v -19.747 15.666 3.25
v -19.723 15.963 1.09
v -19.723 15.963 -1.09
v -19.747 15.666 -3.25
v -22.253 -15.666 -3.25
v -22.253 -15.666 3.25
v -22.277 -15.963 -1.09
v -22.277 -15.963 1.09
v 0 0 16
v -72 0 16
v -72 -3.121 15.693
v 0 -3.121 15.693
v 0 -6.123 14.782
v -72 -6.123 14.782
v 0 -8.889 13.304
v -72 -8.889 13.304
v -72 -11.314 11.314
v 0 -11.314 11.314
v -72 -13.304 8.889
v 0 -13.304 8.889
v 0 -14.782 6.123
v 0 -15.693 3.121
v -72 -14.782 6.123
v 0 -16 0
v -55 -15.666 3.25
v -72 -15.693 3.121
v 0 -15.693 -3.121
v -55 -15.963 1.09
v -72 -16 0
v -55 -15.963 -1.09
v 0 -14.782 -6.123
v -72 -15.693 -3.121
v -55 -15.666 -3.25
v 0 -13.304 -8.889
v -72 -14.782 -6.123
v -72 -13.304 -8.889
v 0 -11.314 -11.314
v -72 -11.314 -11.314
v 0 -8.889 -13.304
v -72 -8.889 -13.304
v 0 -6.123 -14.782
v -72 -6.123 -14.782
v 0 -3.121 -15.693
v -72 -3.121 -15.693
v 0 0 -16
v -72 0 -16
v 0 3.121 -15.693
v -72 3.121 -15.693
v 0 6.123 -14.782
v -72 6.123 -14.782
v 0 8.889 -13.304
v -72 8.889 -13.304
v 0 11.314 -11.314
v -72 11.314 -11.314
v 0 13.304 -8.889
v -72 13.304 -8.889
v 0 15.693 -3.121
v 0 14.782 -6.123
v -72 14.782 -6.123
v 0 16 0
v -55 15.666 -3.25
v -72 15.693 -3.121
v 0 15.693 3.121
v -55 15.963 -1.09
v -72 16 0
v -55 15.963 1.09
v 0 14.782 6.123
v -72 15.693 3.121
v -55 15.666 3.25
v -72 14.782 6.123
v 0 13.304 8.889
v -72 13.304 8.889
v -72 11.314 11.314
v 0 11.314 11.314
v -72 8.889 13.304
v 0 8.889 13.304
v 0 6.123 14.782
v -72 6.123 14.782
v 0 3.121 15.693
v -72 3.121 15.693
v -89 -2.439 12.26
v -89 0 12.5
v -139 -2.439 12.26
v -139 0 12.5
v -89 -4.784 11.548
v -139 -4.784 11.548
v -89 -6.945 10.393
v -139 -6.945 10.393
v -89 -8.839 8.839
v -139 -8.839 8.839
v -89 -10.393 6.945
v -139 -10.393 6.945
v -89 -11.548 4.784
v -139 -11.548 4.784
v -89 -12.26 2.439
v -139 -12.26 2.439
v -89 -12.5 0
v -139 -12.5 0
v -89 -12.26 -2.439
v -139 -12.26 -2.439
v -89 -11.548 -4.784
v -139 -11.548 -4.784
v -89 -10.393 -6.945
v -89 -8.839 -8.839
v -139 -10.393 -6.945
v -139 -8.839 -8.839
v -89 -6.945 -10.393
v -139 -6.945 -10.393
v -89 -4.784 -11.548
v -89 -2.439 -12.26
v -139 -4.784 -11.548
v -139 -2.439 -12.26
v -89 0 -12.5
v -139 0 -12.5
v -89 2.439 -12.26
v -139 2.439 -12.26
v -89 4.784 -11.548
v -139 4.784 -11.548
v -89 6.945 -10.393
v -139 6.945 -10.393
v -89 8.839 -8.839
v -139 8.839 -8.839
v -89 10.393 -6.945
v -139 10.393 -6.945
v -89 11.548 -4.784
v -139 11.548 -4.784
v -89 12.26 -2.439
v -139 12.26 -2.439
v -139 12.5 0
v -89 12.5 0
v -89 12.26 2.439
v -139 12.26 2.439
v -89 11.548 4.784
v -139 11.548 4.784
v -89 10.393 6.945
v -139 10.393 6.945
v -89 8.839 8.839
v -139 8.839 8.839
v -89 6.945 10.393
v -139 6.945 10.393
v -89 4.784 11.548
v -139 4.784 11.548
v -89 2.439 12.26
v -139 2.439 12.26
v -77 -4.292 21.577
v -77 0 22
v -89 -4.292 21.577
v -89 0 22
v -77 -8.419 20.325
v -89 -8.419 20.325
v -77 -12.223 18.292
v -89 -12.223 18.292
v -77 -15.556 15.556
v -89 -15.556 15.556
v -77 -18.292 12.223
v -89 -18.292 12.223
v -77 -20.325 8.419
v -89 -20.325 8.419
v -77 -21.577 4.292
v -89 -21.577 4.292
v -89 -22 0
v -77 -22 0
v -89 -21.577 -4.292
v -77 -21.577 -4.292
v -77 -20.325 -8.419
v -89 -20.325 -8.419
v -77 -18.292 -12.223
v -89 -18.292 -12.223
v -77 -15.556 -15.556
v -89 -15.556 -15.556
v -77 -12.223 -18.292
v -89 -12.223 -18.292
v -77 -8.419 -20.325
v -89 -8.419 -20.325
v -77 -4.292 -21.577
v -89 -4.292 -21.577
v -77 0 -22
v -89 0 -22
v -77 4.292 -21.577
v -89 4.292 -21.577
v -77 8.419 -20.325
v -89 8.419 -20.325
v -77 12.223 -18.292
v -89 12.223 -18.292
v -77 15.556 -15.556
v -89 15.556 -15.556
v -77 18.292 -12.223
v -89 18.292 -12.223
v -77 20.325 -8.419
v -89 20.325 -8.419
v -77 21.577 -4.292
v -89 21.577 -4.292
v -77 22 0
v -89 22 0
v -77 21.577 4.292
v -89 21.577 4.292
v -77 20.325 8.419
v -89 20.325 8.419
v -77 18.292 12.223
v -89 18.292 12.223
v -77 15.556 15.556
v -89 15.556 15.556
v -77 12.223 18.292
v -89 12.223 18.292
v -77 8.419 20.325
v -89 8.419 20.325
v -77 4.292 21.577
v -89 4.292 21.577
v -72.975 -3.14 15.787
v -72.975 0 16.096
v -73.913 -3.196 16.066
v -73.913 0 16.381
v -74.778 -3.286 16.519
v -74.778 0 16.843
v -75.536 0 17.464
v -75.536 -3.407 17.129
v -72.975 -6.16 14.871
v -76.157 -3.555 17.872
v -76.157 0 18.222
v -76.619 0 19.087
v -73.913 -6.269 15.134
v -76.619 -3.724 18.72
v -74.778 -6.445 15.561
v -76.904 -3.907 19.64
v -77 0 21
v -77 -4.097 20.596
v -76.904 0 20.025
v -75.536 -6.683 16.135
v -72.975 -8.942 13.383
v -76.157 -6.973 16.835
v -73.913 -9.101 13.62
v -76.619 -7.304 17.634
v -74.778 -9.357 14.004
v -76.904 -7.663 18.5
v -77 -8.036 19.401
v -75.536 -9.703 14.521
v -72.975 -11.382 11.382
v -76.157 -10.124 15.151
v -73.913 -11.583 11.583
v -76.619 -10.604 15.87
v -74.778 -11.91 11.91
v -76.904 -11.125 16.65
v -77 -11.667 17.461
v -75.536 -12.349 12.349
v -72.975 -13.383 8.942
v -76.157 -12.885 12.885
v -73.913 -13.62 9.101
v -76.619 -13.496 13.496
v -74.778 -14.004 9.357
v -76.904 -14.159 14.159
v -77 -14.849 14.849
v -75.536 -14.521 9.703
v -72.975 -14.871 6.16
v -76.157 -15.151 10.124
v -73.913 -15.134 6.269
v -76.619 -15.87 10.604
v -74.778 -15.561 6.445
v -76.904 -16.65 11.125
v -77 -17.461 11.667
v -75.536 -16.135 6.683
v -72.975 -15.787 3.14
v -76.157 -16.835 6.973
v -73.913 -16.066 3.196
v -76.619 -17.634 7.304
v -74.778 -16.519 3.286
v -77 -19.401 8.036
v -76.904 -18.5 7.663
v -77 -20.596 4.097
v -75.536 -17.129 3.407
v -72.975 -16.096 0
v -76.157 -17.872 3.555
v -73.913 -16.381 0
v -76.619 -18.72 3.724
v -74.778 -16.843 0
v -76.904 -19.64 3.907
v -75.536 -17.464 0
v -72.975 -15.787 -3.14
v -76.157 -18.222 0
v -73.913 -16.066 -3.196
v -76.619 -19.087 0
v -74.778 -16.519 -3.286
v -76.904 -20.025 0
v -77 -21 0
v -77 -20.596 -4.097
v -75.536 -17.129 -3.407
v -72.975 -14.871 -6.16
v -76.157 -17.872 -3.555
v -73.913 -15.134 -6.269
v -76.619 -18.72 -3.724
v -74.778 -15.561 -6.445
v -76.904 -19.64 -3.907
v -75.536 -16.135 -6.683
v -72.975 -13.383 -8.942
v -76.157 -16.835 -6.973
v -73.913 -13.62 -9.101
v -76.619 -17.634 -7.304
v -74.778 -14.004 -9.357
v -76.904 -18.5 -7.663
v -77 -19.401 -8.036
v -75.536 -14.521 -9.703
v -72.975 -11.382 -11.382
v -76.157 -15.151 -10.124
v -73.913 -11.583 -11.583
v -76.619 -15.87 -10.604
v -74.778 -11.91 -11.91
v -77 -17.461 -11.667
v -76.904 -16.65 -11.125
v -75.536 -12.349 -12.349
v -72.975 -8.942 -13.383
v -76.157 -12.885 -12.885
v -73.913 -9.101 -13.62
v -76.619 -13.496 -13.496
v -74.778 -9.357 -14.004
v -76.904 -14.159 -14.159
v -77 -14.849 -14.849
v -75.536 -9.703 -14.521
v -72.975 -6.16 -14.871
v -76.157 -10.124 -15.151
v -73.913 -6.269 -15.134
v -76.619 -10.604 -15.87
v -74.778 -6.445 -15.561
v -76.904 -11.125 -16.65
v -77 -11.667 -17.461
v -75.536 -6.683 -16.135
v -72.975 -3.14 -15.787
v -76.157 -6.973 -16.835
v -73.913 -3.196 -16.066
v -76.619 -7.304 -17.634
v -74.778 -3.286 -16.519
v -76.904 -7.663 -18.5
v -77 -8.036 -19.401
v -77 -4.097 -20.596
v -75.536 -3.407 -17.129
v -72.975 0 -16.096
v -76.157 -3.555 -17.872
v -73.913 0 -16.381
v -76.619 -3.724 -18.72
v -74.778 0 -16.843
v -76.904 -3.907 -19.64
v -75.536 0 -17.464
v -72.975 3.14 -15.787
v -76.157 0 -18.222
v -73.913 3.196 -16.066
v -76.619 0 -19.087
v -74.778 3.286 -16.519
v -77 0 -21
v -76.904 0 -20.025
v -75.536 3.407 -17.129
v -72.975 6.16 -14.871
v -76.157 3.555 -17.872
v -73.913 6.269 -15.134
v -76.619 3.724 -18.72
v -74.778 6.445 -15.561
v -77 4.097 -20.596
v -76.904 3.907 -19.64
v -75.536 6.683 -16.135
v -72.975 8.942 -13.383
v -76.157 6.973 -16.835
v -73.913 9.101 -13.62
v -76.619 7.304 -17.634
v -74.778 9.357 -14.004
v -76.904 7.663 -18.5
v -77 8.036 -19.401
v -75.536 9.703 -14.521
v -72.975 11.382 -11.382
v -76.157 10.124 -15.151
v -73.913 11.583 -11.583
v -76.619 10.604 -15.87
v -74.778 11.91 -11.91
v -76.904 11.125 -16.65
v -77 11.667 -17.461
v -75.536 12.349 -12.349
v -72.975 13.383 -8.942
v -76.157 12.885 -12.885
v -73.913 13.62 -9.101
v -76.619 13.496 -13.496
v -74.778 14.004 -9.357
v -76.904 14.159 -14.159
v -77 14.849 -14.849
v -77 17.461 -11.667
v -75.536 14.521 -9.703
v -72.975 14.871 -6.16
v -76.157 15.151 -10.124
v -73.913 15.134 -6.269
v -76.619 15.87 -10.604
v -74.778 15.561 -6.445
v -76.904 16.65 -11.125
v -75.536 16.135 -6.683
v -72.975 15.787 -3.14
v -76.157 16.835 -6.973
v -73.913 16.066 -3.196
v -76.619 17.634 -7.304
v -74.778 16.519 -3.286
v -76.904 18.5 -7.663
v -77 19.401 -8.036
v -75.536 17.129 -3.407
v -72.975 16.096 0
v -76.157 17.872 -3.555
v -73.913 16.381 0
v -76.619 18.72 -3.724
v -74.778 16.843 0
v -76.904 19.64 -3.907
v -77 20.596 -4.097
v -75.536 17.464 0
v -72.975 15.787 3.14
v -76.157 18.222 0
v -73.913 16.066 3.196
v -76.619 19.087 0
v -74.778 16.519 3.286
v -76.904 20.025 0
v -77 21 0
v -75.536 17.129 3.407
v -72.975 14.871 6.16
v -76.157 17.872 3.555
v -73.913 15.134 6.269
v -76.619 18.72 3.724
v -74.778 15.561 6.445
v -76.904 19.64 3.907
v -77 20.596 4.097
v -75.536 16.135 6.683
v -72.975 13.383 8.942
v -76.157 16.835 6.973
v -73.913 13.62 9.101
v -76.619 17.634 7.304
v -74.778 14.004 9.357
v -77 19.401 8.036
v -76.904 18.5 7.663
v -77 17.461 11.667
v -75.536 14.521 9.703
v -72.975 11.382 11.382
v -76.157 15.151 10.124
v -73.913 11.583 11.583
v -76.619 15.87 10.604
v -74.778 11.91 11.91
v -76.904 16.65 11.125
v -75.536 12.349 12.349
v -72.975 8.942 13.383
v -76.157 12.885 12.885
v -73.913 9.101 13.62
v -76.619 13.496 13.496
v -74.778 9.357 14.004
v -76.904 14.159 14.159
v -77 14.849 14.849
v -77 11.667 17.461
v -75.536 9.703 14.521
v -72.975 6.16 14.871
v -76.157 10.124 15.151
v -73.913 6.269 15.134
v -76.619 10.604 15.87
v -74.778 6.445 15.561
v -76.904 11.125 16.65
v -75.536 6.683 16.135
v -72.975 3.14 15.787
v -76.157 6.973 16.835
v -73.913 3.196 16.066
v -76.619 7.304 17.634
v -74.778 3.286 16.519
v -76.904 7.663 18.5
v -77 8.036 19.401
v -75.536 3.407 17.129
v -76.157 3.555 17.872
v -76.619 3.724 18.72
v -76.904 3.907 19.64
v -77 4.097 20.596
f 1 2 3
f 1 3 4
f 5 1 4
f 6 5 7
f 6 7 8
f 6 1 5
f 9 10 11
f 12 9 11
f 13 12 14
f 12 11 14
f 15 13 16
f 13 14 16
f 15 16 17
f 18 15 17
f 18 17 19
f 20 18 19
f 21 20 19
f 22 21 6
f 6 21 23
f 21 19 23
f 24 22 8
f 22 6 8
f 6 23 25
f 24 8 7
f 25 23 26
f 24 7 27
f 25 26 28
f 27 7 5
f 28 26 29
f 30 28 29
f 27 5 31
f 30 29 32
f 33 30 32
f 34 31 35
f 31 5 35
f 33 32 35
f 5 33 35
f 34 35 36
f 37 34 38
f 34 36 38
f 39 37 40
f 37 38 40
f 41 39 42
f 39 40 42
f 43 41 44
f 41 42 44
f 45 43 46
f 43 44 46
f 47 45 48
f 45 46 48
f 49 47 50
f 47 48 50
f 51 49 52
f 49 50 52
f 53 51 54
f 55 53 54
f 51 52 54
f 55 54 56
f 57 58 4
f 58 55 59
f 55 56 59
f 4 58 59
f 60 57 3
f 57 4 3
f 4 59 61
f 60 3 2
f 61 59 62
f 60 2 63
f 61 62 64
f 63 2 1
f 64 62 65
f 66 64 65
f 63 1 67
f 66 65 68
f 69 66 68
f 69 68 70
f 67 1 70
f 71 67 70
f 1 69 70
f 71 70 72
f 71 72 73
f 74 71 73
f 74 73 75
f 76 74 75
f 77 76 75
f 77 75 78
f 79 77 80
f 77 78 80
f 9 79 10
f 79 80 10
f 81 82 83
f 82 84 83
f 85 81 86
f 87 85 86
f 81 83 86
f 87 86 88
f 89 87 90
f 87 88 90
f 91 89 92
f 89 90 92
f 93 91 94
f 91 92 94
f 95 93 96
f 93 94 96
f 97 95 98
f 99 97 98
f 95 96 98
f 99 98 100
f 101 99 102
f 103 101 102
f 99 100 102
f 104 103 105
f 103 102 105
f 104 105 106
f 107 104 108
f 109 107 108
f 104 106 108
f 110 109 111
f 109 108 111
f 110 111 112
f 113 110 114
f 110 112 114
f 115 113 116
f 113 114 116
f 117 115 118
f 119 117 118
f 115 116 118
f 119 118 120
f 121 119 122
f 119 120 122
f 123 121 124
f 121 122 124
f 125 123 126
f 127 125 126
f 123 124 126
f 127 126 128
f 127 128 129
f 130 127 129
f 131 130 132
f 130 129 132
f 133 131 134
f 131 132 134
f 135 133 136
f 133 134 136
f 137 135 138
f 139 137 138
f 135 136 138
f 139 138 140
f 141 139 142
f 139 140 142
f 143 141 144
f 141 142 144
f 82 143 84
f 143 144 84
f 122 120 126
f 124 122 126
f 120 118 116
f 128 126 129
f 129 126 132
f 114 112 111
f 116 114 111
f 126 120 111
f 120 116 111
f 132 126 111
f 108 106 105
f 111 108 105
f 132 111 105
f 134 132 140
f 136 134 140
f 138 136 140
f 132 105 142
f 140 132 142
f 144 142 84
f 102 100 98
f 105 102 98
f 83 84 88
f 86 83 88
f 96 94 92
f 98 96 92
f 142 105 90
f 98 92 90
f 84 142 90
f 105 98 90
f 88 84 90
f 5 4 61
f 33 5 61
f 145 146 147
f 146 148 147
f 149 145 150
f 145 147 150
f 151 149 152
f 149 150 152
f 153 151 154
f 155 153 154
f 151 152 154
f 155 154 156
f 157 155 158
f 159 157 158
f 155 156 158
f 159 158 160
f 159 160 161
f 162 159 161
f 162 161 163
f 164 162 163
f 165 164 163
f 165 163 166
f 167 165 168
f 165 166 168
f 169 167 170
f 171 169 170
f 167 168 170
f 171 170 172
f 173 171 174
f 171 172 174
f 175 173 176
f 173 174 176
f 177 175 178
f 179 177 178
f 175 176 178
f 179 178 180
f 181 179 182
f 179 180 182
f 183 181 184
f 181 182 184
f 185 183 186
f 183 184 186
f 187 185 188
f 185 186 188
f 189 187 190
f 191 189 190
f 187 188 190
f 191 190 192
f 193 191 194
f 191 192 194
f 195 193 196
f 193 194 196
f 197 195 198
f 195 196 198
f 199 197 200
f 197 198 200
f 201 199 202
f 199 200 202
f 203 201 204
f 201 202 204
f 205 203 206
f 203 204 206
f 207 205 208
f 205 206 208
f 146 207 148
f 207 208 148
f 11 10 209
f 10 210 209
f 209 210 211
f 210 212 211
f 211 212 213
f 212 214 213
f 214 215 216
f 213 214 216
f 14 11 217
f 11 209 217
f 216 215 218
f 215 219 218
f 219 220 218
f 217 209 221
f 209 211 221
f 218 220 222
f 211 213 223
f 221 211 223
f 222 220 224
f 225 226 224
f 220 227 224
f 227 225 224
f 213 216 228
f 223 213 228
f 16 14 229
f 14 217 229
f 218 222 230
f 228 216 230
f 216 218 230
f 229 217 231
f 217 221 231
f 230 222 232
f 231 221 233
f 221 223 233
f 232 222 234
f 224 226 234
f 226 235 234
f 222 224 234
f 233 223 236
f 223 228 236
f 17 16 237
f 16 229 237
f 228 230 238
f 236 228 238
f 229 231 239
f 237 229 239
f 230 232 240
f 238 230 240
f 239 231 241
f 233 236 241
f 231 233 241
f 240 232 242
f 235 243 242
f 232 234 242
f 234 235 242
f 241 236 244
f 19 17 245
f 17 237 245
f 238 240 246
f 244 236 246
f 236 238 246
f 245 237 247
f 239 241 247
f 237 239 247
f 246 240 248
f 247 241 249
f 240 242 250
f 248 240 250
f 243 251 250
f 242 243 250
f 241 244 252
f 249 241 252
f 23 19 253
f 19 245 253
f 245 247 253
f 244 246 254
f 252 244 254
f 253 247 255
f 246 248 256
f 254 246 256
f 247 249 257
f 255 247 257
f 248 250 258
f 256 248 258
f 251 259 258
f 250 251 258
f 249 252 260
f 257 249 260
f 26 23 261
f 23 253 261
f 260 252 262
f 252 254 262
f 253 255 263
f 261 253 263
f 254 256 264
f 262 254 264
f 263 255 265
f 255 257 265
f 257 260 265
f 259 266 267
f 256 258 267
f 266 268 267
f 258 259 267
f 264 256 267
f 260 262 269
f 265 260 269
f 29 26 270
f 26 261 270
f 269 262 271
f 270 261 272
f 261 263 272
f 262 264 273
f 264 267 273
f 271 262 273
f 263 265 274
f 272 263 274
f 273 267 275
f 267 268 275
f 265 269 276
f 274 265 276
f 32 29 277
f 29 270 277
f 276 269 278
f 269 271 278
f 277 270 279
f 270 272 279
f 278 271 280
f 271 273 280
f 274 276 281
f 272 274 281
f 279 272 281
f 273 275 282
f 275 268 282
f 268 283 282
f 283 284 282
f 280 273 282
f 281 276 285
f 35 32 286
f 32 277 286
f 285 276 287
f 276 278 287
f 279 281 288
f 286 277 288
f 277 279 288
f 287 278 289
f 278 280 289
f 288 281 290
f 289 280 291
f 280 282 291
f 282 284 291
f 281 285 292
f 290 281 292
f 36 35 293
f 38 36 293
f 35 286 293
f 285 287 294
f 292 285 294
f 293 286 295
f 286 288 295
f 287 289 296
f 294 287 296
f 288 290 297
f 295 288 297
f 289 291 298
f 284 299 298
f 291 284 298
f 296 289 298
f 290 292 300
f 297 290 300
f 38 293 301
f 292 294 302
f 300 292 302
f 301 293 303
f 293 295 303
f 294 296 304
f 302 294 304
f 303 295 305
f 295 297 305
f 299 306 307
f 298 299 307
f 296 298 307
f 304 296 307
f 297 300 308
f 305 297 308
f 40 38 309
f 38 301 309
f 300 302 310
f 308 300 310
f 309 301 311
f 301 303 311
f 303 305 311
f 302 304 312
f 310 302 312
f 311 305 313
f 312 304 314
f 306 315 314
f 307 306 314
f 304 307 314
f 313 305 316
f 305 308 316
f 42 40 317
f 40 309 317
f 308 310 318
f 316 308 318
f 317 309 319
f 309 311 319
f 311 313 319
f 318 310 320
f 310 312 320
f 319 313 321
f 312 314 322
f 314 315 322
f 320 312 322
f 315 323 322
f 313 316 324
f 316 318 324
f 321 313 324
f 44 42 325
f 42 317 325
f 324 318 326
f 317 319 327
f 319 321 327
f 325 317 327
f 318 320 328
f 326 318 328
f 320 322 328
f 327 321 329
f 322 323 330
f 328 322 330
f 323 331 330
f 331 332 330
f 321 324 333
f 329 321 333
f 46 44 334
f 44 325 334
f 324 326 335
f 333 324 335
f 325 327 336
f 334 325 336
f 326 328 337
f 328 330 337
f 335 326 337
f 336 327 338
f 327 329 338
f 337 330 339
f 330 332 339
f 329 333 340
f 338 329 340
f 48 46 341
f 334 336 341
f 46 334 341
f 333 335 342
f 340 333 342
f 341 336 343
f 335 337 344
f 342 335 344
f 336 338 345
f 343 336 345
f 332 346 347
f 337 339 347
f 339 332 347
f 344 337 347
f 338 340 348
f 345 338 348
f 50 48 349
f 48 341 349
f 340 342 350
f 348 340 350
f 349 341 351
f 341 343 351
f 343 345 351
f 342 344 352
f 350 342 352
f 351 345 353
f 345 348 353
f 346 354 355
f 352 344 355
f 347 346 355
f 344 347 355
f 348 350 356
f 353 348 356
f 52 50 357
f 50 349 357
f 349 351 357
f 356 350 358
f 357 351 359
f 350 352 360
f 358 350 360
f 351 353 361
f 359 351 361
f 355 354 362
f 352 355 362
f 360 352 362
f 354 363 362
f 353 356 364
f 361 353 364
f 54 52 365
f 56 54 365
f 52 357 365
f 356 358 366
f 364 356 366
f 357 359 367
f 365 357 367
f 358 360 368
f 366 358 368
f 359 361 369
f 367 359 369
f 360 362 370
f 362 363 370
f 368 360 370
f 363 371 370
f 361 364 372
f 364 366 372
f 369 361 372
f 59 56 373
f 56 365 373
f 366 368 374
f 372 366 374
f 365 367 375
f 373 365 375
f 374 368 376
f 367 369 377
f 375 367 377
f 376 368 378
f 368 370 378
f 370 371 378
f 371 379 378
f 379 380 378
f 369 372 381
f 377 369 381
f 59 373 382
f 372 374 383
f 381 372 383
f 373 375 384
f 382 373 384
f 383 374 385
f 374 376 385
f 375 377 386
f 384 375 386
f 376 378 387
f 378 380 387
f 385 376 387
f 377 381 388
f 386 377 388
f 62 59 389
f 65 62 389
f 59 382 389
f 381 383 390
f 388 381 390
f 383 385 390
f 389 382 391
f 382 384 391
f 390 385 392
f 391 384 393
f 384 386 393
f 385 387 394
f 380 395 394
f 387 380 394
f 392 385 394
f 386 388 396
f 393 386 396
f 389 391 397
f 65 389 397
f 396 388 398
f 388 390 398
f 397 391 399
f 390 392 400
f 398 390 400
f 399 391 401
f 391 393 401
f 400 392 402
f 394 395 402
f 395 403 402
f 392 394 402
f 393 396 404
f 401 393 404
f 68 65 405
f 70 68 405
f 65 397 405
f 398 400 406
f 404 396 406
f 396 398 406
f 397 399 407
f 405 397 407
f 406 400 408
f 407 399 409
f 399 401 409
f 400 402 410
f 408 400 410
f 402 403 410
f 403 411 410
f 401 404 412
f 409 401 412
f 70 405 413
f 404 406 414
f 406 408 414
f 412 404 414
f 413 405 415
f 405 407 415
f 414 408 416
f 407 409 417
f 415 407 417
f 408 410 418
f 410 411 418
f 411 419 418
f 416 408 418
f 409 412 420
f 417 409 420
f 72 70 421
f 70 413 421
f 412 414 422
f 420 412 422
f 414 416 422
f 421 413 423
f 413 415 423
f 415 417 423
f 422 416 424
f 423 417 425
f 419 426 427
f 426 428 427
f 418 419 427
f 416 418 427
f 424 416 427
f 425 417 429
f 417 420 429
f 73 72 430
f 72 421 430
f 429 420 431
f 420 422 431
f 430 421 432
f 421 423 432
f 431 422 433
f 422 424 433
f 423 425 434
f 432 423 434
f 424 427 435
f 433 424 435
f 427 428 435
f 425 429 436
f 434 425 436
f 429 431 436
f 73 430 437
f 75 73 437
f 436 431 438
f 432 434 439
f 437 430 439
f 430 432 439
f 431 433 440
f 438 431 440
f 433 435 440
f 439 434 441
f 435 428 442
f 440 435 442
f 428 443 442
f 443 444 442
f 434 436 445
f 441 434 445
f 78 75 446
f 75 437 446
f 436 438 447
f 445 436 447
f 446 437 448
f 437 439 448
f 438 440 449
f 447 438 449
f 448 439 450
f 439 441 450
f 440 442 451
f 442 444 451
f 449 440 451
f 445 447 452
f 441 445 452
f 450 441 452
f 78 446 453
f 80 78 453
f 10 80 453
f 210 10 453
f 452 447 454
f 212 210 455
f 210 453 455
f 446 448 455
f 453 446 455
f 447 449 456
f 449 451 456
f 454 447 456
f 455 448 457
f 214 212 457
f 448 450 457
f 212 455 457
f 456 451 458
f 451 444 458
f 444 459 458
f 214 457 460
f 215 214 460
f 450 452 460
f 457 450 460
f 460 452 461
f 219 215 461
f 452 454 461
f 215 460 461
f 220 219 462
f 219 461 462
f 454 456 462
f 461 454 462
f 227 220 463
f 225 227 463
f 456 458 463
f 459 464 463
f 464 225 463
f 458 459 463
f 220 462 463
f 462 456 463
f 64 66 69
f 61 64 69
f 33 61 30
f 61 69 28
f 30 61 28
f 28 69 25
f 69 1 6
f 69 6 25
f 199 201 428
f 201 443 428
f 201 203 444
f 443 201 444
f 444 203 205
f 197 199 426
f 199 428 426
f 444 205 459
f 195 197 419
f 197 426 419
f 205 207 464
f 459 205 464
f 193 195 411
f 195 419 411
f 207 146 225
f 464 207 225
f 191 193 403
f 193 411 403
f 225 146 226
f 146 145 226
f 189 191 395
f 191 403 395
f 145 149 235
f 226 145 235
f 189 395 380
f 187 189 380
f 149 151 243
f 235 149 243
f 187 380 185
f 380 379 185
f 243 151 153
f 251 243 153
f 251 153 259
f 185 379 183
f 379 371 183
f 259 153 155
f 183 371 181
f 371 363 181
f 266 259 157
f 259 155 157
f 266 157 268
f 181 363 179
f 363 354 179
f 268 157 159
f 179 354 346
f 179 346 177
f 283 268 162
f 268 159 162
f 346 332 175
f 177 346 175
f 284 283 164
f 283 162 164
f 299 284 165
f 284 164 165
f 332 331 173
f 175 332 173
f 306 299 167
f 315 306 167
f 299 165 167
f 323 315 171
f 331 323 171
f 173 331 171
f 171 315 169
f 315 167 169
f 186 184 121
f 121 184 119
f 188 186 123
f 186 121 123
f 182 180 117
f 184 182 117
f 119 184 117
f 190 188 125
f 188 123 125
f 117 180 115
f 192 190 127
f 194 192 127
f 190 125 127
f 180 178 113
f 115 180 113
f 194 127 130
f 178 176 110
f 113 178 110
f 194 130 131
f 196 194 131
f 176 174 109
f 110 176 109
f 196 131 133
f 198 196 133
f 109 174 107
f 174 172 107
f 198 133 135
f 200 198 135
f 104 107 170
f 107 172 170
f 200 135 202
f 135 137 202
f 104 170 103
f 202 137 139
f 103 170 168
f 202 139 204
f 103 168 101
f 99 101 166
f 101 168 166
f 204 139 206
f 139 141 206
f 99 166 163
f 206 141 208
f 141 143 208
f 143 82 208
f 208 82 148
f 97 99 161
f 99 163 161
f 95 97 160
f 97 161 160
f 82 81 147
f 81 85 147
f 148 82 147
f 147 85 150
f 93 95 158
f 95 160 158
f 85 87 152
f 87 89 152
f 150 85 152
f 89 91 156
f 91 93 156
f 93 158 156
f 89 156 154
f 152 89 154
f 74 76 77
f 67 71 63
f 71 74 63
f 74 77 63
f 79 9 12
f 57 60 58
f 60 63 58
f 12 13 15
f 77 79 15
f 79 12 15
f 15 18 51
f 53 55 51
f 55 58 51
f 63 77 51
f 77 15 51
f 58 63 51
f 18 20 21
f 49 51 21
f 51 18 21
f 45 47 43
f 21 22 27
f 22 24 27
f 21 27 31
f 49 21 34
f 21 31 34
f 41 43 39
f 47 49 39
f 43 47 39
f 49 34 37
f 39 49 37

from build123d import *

# Parameters (mm, degrees)
CUT_EXTRUDE1_DEPTH = 3.25


with BuildPart() as part:
    # Sketch1 → Revolve1 (revolve)
    with BuildSketch(Plane(origin=(0, 0, 0), x_dir=(1, 0, 0), z_dir=(0, 1, 0)), mode=Mode.PRIVATE) as revolve1_sk:
        with BuildLine():
            Line((-139, 0), (0, 0))
            Line((0, 0), (0, 16))
            Line((0, 16), (-72, 16))
            ThreePointArc((-72, 16), (-75.535533906, 17.464466094), (-77, 21))
            Line((-77, 21), (-77, 22))
            Line((-77, 22), (-89, 22))
            Line((-89, 22), (-89, 12.5))
            Line((-89, 12.5), (-139, 12.5))
            Line((-139, 12.5), (-139, 0))
        make_face()
    revolve(revolve1_sk.sketch.rotate(Axis((-139, 0, 0), (1, 0, 0)), 180), axis=Axis((-139, 0, 0), (1, 0, 0)))

    # Sketch2 → Cut-Extrude1 (cut, symmetric)
    with BuildSketch(Plane.XY):
        Polygon((-55, 0), (-55, 50), (-17, 50), (-25, -50), (-55, -50), align=None)
    extrude(amount=CUT_EXTRUDE1_DEPTH, both=True, mode=Mode.SUBTRACT)


solid = part.part
